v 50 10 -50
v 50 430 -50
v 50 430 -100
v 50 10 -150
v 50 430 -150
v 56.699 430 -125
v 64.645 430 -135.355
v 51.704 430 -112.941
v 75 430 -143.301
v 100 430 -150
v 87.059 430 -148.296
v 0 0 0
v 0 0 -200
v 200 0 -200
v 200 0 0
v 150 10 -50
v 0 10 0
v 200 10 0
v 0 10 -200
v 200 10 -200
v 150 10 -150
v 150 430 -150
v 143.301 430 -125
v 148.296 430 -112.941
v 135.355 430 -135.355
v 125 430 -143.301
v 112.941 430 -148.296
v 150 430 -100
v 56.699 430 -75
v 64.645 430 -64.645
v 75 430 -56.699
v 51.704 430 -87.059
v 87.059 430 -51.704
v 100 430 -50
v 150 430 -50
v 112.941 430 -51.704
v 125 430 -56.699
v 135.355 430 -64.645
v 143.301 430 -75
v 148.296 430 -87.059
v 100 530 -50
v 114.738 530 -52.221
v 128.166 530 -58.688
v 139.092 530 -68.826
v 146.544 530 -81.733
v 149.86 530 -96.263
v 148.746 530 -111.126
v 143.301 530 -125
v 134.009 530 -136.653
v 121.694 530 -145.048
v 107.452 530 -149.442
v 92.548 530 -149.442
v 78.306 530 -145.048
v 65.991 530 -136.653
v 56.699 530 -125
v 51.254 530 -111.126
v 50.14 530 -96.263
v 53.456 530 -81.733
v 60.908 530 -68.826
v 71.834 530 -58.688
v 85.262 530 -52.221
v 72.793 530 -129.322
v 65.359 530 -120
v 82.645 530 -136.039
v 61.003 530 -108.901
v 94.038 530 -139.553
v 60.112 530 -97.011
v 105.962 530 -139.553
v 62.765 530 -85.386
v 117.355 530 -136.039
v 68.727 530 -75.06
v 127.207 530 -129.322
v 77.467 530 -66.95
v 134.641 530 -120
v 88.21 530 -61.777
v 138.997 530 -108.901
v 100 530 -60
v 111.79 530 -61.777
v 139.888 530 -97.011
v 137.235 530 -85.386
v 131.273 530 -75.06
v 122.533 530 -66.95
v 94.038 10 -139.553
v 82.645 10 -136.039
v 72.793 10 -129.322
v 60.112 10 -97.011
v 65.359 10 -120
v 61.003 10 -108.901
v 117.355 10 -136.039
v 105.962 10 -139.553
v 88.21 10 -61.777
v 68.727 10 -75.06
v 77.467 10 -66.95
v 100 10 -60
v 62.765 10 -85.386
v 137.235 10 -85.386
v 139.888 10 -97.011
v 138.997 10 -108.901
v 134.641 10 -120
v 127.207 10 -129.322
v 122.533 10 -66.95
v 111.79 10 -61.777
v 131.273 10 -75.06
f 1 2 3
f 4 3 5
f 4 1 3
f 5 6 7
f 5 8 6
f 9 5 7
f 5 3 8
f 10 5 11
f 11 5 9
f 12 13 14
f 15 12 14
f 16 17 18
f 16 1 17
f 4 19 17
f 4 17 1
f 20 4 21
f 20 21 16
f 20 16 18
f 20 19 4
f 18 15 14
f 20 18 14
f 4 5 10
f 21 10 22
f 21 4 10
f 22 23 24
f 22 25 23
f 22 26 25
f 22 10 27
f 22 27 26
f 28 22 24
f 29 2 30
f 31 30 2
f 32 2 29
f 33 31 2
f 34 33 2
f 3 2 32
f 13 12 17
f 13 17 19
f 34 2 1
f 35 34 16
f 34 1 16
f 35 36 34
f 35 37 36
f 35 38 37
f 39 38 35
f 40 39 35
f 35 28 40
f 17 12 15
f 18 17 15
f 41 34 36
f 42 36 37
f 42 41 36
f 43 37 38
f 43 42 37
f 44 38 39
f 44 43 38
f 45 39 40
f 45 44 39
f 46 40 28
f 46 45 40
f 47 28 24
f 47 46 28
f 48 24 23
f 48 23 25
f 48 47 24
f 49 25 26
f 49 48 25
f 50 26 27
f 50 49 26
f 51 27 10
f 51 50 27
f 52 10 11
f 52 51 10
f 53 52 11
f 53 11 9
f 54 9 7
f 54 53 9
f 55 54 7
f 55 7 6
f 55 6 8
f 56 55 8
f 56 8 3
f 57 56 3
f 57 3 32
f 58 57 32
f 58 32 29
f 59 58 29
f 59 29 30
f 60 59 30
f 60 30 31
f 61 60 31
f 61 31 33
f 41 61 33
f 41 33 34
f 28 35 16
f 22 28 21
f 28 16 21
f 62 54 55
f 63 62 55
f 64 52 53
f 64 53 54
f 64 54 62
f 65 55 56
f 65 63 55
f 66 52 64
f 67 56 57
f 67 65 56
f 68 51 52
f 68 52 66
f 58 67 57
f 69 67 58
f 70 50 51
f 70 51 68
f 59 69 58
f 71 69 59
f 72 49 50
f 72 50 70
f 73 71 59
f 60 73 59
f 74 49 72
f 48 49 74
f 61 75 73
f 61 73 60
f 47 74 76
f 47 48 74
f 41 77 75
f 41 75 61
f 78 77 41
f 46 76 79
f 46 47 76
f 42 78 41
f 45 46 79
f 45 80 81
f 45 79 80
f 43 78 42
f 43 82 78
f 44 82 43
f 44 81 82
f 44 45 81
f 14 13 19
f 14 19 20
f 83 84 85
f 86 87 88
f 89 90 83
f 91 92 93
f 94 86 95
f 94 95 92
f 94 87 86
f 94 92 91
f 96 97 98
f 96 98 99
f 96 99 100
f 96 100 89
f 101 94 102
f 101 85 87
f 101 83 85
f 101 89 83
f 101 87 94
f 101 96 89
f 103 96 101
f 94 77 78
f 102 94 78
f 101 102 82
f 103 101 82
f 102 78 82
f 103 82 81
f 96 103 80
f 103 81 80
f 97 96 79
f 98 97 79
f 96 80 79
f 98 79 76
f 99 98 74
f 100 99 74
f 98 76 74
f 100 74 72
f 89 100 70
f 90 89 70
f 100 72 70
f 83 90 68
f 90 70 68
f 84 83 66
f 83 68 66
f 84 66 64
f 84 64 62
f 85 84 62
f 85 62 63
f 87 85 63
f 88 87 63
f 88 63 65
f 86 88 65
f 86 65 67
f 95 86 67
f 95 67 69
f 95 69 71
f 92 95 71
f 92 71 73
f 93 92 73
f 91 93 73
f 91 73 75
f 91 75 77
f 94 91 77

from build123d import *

# Parameters (mm, degrees)
SKETCH1_W           = 200
SKETCH1_H           = 200
BOSS_EXTRUDE1_DEPTH = 10
SKETCH2_W           = 100
SKETCH2_H           = 100
BOSS_EXTRUDE2_DEPTH = 420
SKETCH3_R           = 40
CUT_EXTRUDE1_DEPTH  = 420
BOSS_EXTRUDE4_START = 100
SKETCH5_R           = 50
SKETCH5_R_2         = 40
BOSS_EXTRUDE4_DEPTH = 100


with BuildPart() as part:
    # Sketch1 → Boss-Extrude1 (new body)
    with BuildSketch(Plane(origin=(0, 0, 0), x_dir=(1, 0, 0), z_dir=(0, 1, 0))):
        with Locations((100, 100)):
            Rectangle(SKETCH1_W, SKETCH1_H)
    extrude(amount=BOSS_EXTRUDE1_DEPTH)

    # Sketch2 → Boss-Extrude2 (add)
    with BuildSketch(Plane(origin=(0, 10, 0), x_dir=(1, 0, 0), z_dir=(0, 1, 0))):
        with Locations((100, 100)):
            Rectangle(SKETCH2_W, SKETCH2_H)
    extrude(amount=BOSS_EXTRUDE2_DEPTH)

    # Sketch3 → Cut-Extrude1 (cut)
    with BuildSketch(Plane(origin=(0, 430, 0), x_dir=(1, 0, 0), z_dir=(0, 1, 0))):
        with Locations(Location((100, 100, 0), (0, 0, 270))):
            Circle(SKETCH3_R)
    extrude(amount=-CUT_EXTRUDE1_DEPTH, mode=Mode.SUBTRACT)

    # Sketch5 → Boss-Extrude4 (add)
    with BuildSketch(Plane(origin=(0, 430, 0), x_dir=(1, 0, 0), z_dir=(0, 1, 0)).offset(BOSS_EXTRUDE4_START)):
        with Locations(Location((100, 100, 0), (0, 0, 270))):
            Circle(SKETCH5_R)
        with Locations(Location((100, 100, 0), (0, 0, 270))):
            Circle(SKETCH5_R_2, mode=Mode.SUBTRACT)
    extrude(amount=-BOSS_EXTRUDE4_DEPTH)


solid = part.part
